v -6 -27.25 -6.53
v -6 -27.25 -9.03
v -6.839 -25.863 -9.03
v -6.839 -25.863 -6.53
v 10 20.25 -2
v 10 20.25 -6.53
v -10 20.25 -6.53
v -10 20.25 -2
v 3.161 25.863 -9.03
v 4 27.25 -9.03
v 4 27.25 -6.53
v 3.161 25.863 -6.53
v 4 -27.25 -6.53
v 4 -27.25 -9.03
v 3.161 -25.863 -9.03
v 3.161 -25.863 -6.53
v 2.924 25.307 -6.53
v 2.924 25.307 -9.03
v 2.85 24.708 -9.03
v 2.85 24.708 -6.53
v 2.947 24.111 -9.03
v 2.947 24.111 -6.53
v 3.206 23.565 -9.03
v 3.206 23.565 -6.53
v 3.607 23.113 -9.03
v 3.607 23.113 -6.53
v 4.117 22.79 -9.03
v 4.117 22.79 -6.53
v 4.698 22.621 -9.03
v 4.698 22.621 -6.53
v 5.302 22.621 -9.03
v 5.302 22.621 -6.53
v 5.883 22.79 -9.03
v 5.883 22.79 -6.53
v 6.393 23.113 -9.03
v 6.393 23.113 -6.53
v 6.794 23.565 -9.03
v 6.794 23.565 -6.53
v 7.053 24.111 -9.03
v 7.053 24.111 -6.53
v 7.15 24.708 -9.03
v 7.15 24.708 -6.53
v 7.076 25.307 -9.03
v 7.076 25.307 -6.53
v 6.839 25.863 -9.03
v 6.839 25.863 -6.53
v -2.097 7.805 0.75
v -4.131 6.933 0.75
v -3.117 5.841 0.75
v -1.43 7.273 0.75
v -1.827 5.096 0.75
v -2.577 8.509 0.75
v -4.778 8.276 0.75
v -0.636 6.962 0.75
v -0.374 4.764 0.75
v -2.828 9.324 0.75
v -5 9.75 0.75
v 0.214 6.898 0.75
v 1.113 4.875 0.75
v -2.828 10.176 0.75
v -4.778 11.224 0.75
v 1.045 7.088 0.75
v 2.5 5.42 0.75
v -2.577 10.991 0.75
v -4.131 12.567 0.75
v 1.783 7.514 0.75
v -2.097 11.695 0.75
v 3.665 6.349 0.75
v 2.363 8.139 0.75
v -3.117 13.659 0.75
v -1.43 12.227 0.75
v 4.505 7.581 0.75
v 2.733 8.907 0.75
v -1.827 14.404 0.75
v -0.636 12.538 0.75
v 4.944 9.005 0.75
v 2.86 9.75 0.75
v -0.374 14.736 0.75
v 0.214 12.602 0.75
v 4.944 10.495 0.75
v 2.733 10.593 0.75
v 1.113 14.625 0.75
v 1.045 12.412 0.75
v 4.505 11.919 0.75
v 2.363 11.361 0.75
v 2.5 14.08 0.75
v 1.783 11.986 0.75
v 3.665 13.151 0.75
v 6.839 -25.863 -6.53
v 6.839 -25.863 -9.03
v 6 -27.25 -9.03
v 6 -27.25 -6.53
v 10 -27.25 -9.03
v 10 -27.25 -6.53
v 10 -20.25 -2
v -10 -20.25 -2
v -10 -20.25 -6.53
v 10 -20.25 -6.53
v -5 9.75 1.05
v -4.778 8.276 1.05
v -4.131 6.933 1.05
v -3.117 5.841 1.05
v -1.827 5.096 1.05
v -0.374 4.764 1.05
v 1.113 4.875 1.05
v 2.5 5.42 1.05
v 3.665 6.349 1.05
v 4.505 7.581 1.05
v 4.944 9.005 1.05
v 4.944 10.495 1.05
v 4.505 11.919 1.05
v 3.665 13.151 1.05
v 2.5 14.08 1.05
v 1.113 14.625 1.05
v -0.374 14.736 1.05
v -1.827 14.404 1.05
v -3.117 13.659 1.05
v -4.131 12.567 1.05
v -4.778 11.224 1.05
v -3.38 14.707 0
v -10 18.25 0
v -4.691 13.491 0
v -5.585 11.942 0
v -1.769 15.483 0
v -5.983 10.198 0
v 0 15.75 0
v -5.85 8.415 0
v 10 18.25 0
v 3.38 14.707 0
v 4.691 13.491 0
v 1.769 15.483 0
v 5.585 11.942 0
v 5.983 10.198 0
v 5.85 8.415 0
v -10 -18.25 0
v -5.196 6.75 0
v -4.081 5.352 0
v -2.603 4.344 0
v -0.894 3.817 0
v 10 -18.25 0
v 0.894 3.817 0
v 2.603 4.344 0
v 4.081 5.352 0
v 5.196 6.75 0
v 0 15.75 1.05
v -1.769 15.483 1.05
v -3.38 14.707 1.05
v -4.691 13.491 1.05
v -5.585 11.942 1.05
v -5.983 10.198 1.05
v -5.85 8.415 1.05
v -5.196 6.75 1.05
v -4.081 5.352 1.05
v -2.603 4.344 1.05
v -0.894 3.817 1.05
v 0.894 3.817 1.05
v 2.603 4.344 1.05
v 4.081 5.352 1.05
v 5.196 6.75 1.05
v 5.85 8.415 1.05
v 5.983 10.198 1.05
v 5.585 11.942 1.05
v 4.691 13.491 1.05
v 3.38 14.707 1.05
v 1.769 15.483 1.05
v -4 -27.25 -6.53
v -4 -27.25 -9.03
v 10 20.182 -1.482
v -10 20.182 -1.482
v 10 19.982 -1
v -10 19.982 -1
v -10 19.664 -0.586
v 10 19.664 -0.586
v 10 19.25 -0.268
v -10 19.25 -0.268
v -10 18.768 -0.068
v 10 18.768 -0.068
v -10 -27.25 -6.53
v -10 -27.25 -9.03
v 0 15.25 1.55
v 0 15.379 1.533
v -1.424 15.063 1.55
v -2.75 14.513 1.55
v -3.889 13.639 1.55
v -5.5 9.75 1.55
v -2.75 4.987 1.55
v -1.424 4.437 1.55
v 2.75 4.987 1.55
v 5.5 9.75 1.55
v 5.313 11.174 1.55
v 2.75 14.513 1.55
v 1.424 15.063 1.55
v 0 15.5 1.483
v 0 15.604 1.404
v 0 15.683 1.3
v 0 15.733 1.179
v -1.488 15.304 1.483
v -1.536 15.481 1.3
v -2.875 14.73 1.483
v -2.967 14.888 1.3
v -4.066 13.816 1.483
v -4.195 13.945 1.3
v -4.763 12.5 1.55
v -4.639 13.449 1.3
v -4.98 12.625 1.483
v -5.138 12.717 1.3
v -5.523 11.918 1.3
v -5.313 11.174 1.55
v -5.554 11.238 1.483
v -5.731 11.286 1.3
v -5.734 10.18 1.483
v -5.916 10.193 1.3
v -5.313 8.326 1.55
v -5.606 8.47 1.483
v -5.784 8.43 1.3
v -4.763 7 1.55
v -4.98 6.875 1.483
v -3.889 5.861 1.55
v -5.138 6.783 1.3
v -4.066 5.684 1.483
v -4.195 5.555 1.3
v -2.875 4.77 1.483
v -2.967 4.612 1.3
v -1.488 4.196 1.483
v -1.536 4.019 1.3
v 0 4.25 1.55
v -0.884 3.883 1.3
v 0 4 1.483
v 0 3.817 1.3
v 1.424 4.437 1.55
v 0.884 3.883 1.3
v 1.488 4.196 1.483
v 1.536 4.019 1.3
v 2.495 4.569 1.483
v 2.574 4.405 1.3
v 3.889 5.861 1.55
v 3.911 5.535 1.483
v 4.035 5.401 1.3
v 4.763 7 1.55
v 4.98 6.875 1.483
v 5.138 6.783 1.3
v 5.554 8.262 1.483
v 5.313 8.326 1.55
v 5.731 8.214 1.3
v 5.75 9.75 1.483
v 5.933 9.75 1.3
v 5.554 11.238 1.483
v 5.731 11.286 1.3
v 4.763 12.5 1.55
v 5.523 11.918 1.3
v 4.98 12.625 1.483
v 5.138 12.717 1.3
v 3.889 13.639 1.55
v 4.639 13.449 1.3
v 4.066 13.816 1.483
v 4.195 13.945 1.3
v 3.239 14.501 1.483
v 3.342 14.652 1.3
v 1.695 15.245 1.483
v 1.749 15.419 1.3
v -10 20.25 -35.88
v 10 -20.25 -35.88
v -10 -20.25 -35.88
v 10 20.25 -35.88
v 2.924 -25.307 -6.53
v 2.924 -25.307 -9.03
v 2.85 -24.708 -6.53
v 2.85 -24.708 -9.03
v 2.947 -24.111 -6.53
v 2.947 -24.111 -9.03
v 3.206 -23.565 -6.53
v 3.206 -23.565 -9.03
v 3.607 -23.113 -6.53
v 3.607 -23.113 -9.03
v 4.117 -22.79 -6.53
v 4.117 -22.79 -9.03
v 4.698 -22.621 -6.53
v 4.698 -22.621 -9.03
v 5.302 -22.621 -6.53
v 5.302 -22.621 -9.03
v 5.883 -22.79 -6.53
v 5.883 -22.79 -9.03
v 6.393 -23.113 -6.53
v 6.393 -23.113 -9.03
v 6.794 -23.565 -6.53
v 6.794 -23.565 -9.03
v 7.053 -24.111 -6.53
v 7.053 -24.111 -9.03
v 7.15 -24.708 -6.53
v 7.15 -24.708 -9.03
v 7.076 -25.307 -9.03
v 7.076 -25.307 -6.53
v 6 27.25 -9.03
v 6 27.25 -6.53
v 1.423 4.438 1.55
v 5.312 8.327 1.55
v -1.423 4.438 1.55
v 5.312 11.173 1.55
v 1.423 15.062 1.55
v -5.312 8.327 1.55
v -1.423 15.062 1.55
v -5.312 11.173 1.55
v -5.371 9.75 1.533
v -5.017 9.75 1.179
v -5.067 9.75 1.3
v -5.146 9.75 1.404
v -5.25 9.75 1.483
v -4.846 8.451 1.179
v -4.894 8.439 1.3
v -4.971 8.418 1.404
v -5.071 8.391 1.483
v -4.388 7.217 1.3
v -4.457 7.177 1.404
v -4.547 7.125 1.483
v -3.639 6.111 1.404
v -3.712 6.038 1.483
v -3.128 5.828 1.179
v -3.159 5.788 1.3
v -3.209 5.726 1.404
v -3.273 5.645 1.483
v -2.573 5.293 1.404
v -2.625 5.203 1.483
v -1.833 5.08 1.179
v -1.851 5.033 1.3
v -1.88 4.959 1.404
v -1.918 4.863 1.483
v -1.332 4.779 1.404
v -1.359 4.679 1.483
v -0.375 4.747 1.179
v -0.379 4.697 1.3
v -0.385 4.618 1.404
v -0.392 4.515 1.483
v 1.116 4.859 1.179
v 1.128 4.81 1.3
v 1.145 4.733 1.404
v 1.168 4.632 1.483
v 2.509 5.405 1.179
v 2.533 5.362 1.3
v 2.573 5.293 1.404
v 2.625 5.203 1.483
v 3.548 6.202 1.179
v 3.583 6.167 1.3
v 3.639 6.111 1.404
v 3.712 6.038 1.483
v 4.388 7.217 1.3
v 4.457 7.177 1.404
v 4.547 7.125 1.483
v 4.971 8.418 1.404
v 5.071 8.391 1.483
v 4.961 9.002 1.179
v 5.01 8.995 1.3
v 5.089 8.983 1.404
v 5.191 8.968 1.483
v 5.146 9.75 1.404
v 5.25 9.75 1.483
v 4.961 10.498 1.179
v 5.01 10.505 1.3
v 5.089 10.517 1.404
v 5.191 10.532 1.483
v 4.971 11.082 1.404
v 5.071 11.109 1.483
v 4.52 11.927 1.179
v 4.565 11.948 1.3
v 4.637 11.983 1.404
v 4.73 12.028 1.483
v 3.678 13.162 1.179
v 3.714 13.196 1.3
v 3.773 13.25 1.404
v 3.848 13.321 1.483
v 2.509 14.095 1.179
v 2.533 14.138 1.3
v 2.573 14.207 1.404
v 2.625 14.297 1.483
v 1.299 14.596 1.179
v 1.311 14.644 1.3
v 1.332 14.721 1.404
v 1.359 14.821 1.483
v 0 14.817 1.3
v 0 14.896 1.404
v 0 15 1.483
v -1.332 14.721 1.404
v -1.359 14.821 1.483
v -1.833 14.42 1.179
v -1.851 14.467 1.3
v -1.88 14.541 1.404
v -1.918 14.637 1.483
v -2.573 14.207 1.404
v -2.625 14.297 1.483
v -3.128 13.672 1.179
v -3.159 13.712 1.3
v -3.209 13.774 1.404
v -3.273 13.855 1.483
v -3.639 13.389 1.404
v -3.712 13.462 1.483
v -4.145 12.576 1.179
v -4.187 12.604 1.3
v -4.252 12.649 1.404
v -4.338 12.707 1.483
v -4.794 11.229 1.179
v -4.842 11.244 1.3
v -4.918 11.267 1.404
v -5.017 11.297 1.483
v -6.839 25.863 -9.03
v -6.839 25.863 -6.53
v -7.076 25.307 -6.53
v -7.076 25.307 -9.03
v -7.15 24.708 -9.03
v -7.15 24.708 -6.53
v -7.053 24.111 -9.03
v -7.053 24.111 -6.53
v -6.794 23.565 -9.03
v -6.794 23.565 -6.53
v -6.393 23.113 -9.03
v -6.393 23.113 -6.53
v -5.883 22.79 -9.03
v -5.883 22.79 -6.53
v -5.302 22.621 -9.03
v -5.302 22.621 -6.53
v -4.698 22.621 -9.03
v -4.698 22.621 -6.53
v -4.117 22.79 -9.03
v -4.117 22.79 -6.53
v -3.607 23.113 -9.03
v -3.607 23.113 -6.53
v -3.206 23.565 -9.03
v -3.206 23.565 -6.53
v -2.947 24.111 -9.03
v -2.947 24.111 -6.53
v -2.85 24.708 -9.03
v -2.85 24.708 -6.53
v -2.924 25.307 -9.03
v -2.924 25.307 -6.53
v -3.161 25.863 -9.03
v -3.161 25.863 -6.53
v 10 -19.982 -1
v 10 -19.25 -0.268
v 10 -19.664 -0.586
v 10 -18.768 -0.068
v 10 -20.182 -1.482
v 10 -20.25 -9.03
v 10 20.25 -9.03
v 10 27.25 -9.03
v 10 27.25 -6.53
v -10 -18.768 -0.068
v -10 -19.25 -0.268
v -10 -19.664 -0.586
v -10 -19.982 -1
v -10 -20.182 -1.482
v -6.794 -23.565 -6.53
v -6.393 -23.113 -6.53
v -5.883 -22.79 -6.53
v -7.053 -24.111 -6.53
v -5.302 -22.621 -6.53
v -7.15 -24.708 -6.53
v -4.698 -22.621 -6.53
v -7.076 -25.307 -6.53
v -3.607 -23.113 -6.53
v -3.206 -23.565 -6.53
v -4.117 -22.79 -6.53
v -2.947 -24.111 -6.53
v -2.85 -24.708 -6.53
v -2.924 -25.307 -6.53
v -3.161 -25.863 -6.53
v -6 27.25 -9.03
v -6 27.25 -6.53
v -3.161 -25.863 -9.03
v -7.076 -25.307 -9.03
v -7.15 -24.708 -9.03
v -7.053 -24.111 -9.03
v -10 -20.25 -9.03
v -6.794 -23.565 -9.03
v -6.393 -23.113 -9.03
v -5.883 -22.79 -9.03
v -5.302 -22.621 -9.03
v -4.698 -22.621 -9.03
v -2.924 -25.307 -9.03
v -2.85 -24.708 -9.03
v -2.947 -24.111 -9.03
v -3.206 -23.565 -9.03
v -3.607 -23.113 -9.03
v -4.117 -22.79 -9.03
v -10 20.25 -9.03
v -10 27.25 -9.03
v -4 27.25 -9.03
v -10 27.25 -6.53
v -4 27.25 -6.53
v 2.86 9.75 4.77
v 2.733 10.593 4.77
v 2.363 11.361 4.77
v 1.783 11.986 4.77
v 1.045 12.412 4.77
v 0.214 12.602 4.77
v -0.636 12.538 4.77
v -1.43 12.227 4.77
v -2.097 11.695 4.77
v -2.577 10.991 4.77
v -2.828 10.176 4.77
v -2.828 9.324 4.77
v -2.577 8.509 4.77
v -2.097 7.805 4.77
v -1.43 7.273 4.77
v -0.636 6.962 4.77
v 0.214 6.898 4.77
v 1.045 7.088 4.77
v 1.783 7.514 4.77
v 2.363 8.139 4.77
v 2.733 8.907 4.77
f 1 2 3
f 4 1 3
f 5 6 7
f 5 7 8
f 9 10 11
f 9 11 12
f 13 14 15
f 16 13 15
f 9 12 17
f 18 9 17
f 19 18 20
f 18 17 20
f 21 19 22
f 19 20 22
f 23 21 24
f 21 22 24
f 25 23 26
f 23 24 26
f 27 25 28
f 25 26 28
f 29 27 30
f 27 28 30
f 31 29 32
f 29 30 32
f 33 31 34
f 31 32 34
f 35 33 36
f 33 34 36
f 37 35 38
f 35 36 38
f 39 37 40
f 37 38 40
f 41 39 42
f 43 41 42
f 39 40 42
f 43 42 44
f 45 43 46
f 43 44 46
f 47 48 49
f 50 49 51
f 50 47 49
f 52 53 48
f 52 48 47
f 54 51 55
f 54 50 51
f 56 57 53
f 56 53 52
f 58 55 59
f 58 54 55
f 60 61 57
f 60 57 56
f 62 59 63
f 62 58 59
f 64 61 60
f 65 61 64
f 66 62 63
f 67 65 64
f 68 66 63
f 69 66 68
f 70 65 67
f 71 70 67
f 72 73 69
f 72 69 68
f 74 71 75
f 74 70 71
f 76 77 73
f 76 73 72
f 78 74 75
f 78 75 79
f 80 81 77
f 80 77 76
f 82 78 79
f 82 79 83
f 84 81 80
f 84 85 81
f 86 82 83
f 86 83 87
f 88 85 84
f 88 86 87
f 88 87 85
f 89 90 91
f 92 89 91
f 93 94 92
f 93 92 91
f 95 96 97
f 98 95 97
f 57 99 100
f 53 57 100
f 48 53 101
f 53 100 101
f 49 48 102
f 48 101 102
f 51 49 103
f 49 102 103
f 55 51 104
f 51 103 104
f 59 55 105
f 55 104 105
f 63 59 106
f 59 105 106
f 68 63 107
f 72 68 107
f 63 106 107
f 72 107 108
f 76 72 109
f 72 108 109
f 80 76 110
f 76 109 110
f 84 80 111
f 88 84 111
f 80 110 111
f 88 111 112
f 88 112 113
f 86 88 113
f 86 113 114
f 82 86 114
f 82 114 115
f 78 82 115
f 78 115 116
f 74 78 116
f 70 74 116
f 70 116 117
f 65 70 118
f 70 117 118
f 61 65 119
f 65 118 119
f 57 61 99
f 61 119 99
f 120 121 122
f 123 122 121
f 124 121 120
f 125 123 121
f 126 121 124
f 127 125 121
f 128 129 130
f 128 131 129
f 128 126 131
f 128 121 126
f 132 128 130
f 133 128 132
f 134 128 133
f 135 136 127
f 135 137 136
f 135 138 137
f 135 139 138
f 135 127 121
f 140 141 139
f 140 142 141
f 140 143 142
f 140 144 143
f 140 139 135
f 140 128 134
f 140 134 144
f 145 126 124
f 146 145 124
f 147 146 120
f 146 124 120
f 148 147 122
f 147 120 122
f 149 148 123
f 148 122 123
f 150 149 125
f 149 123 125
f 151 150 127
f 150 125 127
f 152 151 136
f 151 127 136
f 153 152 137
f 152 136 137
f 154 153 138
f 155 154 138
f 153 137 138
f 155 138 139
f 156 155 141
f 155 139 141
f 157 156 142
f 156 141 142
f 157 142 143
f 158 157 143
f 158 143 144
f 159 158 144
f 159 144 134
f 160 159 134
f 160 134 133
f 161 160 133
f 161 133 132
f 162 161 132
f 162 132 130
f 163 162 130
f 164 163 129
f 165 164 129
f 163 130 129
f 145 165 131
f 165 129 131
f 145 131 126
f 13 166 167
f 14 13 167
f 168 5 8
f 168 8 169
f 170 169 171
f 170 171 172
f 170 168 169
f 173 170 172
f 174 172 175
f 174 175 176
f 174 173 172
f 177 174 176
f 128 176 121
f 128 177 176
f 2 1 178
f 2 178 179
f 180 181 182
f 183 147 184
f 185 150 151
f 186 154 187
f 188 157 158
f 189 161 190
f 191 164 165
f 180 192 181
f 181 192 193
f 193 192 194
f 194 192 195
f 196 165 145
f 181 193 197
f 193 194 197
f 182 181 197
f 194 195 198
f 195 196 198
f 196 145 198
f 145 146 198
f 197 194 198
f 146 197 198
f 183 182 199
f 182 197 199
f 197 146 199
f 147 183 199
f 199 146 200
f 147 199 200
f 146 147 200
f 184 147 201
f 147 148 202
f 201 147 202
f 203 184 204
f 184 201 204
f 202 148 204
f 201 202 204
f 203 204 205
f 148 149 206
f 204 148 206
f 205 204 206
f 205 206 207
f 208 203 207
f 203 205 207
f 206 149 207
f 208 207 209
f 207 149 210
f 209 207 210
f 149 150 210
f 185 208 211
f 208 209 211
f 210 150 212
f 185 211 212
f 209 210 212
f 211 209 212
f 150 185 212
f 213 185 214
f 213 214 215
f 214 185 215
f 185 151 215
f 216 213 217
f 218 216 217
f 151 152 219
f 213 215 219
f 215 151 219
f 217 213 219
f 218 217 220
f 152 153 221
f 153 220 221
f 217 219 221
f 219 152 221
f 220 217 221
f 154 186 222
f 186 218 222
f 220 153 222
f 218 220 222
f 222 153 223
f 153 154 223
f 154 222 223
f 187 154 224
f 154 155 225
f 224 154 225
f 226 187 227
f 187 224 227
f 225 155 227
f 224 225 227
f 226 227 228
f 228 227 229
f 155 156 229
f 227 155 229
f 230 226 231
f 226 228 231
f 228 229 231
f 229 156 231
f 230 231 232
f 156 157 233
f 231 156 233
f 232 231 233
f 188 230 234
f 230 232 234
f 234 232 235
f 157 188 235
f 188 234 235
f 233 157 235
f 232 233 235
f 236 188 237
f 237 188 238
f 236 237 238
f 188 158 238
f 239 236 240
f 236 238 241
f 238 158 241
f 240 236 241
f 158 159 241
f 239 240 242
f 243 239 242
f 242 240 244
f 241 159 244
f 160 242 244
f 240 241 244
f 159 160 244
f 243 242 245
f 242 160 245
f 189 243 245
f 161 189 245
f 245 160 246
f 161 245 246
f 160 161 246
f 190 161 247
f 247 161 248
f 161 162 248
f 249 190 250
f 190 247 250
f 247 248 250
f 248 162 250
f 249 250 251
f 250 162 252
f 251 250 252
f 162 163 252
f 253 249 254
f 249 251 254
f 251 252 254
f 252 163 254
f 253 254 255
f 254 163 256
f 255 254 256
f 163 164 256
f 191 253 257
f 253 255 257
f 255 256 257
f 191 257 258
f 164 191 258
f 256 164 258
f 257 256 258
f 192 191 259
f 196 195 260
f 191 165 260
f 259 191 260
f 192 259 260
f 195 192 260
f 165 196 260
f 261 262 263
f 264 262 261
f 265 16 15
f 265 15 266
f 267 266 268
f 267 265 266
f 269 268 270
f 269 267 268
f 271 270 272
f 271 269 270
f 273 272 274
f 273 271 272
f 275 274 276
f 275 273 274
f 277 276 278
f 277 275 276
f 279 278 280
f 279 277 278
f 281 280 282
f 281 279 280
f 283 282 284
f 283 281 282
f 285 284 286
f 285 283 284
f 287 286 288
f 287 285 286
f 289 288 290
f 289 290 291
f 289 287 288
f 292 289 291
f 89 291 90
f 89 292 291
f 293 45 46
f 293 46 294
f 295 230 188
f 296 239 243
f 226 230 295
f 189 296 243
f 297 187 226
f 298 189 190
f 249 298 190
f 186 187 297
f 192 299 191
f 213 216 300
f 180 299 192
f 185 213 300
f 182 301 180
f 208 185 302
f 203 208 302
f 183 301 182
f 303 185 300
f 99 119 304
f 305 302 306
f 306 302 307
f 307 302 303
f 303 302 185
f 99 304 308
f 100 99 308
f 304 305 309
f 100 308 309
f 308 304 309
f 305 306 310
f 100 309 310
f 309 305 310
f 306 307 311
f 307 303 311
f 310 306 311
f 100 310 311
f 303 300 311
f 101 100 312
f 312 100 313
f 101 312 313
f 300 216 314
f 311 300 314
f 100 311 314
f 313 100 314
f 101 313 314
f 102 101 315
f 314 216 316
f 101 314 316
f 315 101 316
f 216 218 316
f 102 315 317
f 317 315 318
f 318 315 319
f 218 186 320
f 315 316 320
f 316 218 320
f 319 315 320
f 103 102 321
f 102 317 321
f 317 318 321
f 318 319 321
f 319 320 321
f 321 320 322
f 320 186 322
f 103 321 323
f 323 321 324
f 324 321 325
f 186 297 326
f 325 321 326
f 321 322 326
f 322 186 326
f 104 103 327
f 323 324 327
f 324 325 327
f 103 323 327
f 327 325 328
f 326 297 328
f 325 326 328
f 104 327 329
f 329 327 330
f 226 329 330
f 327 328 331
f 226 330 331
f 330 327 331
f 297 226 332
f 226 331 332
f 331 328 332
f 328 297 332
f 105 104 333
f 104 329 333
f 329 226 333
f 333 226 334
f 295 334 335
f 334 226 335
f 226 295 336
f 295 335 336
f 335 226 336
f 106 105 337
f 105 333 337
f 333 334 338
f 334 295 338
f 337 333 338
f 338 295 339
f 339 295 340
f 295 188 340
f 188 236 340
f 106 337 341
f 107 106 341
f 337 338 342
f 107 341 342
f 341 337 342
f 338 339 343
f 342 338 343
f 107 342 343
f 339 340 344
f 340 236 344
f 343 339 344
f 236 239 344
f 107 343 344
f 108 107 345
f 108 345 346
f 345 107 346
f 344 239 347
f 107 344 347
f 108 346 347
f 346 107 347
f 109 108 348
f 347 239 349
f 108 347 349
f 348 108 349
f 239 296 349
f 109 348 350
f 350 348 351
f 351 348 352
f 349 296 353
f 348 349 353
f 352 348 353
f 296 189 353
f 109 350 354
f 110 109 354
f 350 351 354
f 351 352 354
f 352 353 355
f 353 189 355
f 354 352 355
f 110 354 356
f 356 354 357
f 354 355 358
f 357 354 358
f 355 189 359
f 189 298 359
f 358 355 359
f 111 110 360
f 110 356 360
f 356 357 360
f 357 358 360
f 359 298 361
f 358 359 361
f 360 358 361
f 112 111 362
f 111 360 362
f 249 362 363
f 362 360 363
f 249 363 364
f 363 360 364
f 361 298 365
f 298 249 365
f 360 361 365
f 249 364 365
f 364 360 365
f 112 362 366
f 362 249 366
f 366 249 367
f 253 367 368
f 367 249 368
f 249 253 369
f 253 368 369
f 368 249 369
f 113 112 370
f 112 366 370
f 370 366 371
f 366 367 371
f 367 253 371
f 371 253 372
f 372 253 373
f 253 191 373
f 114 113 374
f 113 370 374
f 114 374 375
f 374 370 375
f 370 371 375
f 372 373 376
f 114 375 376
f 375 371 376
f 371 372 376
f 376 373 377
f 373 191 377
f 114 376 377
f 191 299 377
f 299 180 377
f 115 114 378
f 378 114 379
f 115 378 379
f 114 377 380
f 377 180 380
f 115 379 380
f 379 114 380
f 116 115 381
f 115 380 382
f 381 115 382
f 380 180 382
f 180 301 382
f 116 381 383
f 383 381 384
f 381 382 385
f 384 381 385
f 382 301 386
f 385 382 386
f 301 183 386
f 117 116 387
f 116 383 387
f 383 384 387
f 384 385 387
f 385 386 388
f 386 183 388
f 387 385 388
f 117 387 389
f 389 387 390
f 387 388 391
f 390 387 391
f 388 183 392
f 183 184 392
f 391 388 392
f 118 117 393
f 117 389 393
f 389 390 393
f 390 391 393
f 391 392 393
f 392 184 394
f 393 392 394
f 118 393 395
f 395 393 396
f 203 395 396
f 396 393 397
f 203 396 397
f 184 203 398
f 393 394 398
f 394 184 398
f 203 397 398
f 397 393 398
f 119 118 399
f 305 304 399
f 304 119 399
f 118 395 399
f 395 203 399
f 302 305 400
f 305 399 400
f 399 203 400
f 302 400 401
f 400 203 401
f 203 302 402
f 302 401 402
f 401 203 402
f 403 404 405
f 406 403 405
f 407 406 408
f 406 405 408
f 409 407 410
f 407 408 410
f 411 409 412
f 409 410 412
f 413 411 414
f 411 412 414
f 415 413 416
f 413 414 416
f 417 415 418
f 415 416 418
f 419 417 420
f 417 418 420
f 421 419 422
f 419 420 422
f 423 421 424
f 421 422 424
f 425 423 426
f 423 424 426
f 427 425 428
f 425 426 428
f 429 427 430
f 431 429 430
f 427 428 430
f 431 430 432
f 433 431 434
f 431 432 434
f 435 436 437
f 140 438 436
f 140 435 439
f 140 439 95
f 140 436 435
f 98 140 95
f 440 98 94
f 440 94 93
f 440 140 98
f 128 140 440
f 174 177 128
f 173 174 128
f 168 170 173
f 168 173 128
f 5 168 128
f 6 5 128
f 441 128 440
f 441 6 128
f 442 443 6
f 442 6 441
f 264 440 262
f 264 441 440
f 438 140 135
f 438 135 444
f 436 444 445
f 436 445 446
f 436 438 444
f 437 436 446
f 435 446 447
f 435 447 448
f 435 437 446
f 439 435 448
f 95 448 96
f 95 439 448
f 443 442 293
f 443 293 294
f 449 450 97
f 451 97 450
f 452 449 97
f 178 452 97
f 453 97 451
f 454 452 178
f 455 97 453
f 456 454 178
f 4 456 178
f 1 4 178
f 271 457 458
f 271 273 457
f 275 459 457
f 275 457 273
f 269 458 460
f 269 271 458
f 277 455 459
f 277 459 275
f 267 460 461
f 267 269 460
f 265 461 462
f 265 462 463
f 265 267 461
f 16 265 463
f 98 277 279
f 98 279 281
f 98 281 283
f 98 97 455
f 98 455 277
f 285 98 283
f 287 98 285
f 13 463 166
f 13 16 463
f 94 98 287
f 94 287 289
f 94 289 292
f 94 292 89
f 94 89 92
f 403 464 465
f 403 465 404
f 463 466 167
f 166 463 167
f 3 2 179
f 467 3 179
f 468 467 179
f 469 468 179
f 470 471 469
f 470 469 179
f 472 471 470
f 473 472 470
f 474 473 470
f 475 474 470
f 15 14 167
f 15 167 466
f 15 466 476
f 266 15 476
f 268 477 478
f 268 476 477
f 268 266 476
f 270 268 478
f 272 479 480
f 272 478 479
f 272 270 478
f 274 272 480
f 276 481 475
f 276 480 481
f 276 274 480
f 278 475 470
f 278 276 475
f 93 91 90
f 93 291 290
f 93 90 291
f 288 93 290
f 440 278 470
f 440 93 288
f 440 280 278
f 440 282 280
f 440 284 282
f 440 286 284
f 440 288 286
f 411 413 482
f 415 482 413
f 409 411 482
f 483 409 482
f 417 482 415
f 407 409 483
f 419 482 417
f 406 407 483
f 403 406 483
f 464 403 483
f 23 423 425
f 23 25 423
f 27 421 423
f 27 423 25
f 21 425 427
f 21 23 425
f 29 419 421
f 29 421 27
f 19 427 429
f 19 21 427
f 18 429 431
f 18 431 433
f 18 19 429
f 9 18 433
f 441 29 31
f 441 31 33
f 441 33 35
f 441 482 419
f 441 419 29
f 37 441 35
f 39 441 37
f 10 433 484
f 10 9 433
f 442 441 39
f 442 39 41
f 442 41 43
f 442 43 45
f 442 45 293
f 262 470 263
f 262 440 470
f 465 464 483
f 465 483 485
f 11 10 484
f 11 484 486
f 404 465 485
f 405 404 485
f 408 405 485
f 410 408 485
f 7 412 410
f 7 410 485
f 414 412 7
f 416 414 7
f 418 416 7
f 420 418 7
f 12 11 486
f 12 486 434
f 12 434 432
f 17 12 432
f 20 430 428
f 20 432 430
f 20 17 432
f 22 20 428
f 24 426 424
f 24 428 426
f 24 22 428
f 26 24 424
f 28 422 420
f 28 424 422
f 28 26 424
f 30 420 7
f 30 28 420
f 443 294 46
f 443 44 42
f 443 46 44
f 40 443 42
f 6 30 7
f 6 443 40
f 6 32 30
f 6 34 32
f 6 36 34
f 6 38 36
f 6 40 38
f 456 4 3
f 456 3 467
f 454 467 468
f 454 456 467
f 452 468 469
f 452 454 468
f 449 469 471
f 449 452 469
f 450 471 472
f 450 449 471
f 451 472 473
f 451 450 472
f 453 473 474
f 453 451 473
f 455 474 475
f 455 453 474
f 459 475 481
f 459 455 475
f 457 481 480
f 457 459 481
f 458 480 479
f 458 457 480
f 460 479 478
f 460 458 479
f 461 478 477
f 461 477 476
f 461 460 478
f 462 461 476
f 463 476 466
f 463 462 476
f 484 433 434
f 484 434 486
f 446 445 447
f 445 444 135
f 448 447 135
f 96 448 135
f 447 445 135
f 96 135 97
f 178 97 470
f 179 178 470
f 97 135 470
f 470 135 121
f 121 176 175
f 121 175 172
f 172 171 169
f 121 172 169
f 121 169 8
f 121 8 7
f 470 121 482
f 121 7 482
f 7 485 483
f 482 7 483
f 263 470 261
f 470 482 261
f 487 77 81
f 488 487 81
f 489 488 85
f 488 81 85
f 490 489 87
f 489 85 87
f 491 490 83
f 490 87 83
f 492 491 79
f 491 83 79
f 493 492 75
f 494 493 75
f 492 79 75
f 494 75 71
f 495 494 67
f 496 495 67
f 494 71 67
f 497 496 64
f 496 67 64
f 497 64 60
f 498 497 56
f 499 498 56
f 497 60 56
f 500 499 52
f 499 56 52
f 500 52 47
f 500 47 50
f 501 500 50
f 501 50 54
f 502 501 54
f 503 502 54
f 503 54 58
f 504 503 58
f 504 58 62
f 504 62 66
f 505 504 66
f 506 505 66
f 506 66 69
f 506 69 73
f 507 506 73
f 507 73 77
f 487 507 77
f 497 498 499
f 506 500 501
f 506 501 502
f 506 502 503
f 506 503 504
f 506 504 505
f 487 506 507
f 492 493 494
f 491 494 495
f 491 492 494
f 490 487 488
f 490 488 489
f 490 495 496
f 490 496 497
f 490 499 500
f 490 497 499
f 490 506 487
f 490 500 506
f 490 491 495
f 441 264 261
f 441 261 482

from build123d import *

# Parameters (mm, degrees)
BOSS_EXTRUDE1_DEPTH = 10
SKETCH3_R           = 2.15
CUT_EXTRUDE2_DEPTH  = 2.5
SKETCH2_R           = 6
BOSS_EXTRUDE2_DEPTH = 1.55
CUT_EXTRUDE1_START  = 1.55
CUT_EXTRUDE1_DEPTH  = 0.8
SKETCH2_4_R         = 2.86
BOSS_EXTRUDE3_DEPTH = 4.77
FILLET1_R           = 0.5


with BuildPart() as part:
    # Sketch1 → Boss-Extrude1 (new, symmetric)
    with BuildSketch(Plane(origin=(0, 0, 0), x_dir=(0, 0, -1), z_dir=(1, 0, 0))):
        with BuildLine():
            Line((35.88, -20.25), (35.88, 20.25))
            Line((35.88, 20.25), (9.03, 20.25))
            Line((9.03, 20.25), (9.03, 27.25))
            Line((9.03, 27.25), (6.53, 27.25))
            Line((6.53, 27.25), (6.53, 20.25))
            Line((6.53, 20.25), (2, 20.25))
            ThreePointArc((2, 20.25), (0.585786438, 19.664213562), (0, 18.25))
            Line((0, 18.25), (0, -18.25))
            ThreePointArc((0, -18.25), (0.585786438, -19.664213562), (2, -20.25))
            Line((2, -20.25), (6.53, -20.25))
            Line((6.53, -20.25), (6.53, -27.25))
            Line((6.53, -27.25), (9.03, -27.25))
            Line((9.03, -27.25), (9.03, -20.25))
            Line((9.03, -20.25), (35.88, -20.25))
        make_face()
    extrude(amount=BOSS_EXTRUDE1_DEPTH, both=True)

    # Sketch3 → Cut-Extrude2 (cut)
    with BuildSketch(Plane.XY.offset(-6.53)):
        with Locations((-5, 24.75)):
            Circle(SKETCH3_R)
        with BuildLine():
            Line((-6, 27.25), (-6.839329825, 25.86326807))
            ThreePointArc((-6.839329825, 25.86326807), (-5, 26.9), (-3.160670175, 25.86326807))
            Line((-3.160670175, 25.86326807), (-4, 27.25))
            Line((-4, 27.25), (-6, 27.25))
        make_face()
        with Locations((5, 24.75)):
            Circle(SKETCH3_R)
        with BuildLine():
            Line((6, 27.25), (4, 27.25))
            Line((4, 27.25), (3.160670175, 25.86326807))
            ThreePointArc((3.160670175, 25.86326807), (5, 26.9), (6.839329825, 25.86326807))
            Line((6.839329825, 25.86326807), (6, 27.25))
        make_face()
    cut_extrude2 = extrude(amount=-CUT_EXTRUDE2_DEPTH, mode=Mode.SUBTRACT)

    # Sketch2 → Boss-Extrude2 (add)
    with BuildSketch(Plane.XY):
        with Locations(Location((0, 9.75, 0), (0, 0, 90))):
            Circle(SKETCH2_R)
    extrude(amount=BOSS_EXTRUDE2_DEPTH)

    # Sketch2<3> → Cut-Extrude1 (cut)
    with BuildSketch(Plane.XY.offset(CUT_EXTRUDE1_START)):
        with BuildLine():
            ThreePointArc((-2.86, 9.75), (0, 12.61), (2.86, 9.75))
            Line((2.86, 9.75), (5, 9.75))
            ThreePointArc((5, 9.75), (0, 14.75), (-5, 9.75))
            Line((-5, 9.75), (-2.86, 9.75))
        make_face()
        with BuildLine():
            Line((5, 9.75), (2.86, 9.75))
            ThreePointArc((2.86, 9.75), (0, 6.89), (-2.86, 9.75))
            Line((-2.86, 9.75), (-5, 9.75))
            ThreePointArc((-5, 9.75), (0, 4.75), (5, 9.75))
        make_face()
        with BuildLine():
            ThreePointArc((-2.86, 9.75), (0, 6.89), (2.86, 9.75))
            Line((2.86, 9.75), (-2.86, 9.75))
        make_face()
        with BuildLine():
            Line((-2.86, 9.75), (2.86, 9.75))
            ThreePointArc((2.86, 9.75), (0, 12.61), (-2.86, 9.75))
        make_face()
    extrude(amount=-CUT_EXTRUDE1_DEPTH, mode=Mode.SUBTRACT)

    # Sketch2<4> → Boss-Extrude3 (add)
    with BuildSketch(Plane.XY):
        with Locations((0, 9.75)):
            Circle(SKETCH2_4_R)
    extrude(amount=BOSS_EXTRUDE3_DEPTH)

    # Mirror1: Cut-Extrude2 across plane
    add(cut_extrude2.mirror(Plane.ZX), mode=Mode.SUBTRACT)

    # Fillet1
    fillet1_edges = [part.edges().sort_by_distance(p)[0] for p in [
        (0, 3.75, 1.55),
        (5, 9.75, 1.55),
    ]]
    fillet(fillet1_edges, radius=FILLET1_R - 0.0001)  # a hair under: the kernel refuses the full size


solid = part.part
